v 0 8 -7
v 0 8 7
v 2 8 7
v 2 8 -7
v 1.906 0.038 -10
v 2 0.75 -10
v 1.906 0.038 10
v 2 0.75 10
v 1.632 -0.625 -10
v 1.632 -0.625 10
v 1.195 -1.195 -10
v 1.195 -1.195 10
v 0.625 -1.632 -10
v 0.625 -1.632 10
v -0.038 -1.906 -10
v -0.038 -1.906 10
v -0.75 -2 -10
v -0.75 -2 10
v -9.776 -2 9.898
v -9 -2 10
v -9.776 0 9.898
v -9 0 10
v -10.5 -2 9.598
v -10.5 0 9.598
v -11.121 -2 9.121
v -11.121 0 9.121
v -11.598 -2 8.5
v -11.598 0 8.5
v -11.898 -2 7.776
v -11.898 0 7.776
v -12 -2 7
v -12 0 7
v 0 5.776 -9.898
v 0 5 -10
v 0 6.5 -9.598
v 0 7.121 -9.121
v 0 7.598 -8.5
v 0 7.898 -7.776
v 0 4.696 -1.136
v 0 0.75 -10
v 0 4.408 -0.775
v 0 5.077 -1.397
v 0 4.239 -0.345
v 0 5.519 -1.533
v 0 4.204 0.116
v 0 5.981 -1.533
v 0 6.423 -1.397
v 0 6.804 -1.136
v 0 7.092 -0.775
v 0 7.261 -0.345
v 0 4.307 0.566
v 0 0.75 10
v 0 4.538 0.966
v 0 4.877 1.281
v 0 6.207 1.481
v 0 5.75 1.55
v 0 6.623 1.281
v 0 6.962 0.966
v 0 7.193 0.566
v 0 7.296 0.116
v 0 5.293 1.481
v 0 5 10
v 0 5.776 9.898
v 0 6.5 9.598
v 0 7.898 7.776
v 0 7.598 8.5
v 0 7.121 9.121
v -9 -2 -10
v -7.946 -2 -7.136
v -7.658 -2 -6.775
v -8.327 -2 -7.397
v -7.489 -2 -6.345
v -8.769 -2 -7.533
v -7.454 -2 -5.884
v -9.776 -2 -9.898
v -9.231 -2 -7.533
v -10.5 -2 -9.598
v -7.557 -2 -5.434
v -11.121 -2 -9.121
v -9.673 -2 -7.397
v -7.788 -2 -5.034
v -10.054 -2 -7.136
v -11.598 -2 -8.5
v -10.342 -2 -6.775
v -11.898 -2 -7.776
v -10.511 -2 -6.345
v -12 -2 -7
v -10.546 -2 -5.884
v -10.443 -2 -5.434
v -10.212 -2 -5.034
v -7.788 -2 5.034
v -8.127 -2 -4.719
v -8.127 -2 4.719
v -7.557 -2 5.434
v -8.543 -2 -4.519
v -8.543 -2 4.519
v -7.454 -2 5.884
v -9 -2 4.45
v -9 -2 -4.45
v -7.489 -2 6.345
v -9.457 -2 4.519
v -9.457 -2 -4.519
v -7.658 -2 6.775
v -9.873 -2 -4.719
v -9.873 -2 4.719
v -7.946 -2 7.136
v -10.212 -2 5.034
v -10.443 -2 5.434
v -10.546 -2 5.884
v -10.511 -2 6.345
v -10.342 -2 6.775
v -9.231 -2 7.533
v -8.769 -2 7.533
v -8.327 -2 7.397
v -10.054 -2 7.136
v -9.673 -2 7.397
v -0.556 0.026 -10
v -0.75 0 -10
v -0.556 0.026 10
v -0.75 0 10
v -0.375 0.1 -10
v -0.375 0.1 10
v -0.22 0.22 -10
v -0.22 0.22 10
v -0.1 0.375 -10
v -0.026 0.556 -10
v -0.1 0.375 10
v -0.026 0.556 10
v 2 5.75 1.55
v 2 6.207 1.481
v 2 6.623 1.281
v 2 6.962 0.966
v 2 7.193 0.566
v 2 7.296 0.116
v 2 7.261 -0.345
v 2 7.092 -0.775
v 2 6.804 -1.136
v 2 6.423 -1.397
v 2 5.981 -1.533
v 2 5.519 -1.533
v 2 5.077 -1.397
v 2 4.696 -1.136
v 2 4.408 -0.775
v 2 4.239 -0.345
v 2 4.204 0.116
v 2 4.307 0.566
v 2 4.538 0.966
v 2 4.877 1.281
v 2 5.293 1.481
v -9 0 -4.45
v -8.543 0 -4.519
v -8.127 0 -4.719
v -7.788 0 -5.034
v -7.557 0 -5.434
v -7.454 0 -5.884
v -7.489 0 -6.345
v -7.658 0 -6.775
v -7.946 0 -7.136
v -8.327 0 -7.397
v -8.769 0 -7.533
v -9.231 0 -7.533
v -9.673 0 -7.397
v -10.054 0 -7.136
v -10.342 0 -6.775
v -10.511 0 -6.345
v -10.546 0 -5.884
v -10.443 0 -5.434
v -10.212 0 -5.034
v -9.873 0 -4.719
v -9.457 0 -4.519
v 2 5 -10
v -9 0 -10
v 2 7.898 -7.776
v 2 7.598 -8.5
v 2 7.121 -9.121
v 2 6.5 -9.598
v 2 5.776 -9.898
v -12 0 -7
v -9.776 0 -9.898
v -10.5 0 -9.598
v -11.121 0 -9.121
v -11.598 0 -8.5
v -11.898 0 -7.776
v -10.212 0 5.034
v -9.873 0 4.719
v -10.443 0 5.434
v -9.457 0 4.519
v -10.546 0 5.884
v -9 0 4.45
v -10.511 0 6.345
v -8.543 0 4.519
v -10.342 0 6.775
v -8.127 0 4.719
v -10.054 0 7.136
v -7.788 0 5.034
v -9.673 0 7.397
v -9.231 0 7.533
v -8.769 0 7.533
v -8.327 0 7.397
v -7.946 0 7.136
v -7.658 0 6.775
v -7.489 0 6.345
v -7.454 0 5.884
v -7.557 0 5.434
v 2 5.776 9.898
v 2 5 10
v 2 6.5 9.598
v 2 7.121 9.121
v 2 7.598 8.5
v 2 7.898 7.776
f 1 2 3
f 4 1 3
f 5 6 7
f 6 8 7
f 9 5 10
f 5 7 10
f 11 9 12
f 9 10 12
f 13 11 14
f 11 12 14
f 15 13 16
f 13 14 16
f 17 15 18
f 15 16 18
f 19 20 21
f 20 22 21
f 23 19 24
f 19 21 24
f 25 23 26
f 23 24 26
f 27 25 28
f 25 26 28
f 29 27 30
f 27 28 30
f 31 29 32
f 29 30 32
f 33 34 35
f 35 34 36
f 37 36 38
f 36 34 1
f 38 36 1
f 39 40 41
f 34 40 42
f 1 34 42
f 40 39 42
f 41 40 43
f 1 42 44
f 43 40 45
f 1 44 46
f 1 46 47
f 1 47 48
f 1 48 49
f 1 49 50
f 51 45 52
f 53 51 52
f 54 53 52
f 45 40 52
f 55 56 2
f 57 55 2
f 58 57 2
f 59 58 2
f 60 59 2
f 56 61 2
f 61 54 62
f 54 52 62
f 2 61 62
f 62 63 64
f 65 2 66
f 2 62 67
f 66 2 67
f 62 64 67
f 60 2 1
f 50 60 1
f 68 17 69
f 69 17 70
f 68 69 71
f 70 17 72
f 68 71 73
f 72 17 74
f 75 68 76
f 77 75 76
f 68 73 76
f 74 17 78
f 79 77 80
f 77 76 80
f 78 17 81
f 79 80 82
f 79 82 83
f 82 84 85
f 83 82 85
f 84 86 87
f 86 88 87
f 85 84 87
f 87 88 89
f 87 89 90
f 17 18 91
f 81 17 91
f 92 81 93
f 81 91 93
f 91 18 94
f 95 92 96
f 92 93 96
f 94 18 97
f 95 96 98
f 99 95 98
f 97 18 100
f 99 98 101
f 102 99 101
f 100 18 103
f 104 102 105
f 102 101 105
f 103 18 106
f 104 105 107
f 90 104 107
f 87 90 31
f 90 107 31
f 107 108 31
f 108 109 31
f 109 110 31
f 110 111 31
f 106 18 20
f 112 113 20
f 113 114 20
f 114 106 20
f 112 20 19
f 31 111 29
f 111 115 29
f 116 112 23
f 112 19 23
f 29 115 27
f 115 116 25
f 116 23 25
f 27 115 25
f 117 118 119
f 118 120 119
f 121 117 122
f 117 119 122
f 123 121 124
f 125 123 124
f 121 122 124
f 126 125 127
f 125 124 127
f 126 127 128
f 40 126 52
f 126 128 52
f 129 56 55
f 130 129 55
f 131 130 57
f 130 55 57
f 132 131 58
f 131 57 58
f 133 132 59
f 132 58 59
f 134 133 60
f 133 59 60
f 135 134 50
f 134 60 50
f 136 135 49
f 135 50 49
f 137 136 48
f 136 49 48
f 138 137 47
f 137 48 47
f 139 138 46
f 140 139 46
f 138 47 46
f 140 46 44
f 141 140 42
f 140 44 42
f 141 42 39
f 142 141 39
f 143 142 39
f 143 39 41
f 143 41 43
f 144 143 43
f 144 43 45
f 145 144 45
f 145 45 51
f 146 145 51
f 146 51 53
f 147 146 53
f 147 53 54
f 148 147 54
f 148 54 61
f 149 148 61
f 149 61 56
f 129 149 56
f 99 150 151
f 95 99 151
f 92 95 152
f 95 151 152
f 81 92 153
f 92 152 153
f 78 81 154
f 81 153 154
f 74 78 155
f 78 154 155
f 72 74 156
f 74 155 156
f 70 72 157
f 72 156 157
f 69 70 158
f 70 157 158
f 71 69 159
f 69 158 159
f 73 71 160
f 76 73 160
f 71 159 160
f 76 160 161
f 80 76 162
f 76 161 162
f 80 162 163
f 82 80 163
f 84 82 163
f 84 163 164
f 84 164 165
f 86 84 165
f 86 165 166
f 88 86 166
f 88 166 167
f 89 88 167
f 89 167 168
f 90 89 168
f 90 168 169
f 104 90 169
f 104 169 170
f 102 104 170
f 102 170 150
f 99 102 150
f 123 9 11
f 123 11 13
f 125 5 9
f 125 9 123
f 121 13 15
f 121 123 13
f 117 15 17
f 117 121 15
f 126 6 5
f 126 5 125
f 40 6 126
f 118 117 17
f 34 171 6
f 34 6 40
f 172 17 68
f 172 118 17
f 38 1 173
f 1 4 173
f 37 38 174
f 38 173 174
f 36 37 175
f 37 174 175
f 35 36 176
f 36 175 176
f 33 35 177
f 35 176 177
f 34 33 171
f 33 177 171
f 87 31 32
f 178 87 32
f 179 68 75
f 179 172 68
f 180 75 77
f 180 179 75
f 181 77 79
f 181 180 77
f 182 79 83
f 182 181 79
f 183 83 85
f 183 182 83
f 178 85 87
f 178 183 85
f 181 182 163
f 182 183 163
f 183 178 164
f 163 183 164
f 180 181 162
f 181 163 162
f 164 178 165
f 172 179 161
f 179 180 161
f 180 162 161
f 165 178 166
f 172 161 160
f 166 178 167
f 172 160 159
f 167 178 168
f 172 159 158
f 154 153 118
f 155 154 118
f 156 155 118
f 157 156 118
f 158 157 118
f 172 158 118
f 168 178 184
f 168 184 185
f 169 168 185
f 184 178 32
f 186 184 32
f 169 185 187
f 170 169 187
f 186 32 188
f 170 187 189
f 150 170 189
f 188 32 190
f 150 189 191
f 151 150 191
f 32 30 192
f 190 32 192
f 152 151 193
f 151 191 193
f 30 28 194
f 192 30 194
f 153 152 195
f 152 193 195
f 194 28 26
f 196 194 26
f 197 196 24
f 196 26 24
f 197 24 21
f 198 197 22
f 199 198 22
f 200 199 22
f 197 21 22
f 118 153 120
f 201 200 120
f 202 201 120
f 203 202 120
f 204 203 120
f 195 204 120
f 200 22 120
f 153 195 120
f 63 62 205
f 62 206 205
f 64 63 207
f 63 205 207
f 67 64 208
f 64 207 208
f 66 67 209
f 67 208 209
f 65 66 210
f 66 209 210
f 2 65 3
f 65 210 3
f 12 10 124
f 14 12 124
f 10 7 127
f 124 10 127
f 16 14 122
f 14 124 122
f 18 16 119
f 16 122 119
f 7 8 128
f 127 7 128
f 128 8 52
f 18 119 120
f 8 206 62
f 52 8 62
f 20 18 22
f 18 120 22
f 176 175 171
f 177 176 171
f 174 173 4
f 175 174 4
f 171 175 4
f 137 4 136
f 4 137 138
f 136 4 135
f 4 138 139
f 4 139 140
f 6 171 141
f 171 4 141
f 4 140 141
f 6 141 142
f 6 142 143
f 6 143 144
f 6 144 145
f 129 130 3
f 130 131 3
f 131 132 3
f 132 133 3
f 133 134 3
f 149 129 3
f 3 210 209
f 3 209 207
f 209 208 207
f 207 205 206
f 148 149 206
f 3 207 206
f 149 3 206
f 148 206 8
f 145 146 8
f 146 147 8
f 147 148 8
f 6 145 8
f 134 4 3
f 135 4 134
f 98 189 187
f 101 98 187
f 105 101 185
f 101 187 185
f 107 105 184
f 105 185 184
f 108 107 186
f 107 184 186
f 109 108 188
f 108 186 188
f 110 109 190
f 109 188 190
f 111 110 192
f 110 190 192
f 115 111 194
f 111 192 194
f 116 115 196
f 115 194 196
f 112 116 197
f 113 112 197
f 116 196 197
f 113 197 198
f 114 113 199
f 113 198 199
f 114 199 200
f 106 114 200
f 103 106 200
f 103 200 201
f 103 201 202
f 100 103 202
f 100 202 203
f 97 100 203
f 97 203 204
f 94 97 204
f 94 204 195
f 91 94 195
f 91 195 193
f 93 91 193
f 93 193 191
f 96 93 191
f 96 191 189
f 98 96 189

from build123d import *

# Parameters (mm, degrees)
BASE_FLANGE1_DEPTH = 10
FILLET1_R          = 3
SKETCH6_R          = 1.55
CUT_EXTRUDE1_DEPTH = 18.549928775
SKETCH7_R          = 1.55
CUT_EXTRUDE2_DEPTH = 18.549928775


# Sheet-metal steps are written as plain solids
with BuildPart() as part:
    # Sketch1 → Base-Flange1 (new, symmetric)
    with BuildSketch(Plane.XY):
        with BuildLine():
            Line((-12, 0), (-0.75, 0))
            ThreePointArc((-0.75, 0), (-0.219669914, 0.219669914), (0, 0.75))
            Line((0, 0.75), (0, 8))
            Line((0, 8), (2, 8))
            Line((2, 8), (2, 0.75))
            ThreePointArc((2, 0.75), (1.194543648, -1.194543648), (-0.75, -2))
            Line((-0.75, -2), (-12, -2))
            Line((-12, -2), (-12, 0))
        make_face()
    extrude(amount=BASE_FLANGE1_DEPTH, both=True)

    # Fillet1
    fillet1_edges = [part.edges().sort_by_distance(p)[0] for p in [
        (-12, -1, 10),
        (1, 8, 10),
        (-12, -1, -10),
        (1, 8, -10),
    ]]
    fillet(fillet1_edges, radius=FILLET1_R)

    # Sketch6 → Cut-Extrude1 (cut, through all)
    with BuildSketch(Plane(origin=(0, 0, 0), x_dir=(1, 0, 0), z_dir=(0, 1, 0))):
        with Locations(Location((-9, 6, 0), (0, 0, 270))):
            Circle(SKETCH6_R)
        with Locations(Location((-9, -6, 0), (0, 0, 90))):
            Circle(SKETCH6_R)
    extrude(amount=-CUT_EXTRUDE1_DEPTH, mode=Mode.SUBTRACT)

    # Sketch7 → Cut-Extrude2 (cut, through all)
    with BuildSketch(Plane.ZY):
        with Locations((0, 5.75)):
            Circle(SKETCH7_R)
    extrude(amount=-CUT_EXTRUDE2_DEPTH, mode=Mode.SUBTRACT)


solid = part.part
